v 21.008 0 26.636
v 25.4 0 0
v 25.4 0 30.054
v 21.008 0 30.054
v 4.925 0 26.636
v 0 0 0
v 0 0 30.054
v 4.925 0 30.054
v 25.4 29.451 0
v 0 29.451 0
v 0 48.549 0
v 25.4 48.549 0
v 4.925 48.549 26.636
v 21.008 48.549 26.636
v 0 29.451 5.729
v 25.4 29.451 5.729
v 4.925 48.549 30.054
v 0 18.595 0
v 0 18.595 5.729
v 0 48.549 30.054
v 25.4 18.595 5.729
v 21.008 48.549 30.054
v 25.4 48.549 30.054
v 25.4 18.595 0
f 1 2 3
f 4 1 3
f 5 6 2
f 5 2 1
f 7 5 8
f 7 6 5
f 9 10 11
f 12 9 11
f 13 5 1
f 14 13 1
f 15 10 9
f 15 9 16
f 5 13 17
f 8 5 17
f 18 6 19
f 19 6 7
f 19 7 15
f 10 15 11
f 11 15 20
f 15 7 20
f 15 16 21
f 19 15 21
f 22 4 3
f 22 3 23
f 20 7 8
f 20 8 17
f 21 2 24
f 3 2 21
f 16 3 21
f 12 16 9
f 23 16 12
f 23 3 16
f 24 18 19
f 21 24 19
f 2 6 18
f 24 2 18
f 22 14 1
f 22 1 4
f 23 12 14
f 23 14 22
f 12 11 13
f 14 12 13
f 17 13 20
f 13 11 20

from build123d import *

# Parameters (mm, degrees)
F0_W     = 48.548784
F0_H     = 30.054009
F1_DEPTH = 25.4
F2_W     = 16.082412
F2_H     = 3.417515
F3_DEPTH = 50.8
F4_W     = 10.855629
F4_H     = 5.729359
F5_DEPTH = 50.8


with BuildPart() as f1:
    # F0 (on Right) → F1 (new body)
    with BuildSketch(Plane.YZ):
        with Locations((24.274392, 15.027004)):
            Rectangle(F0_W, F0_H)
    extrude(amount=F1_DEPTH)

    # F2 (on face) → F3 (cut)
    with BuildSketch(Plane.XZ):
        with Locations((12.966445, 28.345251)):
            Rectangle(F2_W, F2_H)
    extrude(amount=-F3_DEPTH, mode=Mode.SUBTRACT)

    # F4 (on face) → F5 (cut)
    with BuildSketch(Plane(origin=(0, 0, 0), x_dir=(0, -1, 0), z_dir=(-1, 0, 0))):
        with Locations((-24.023103, 2.864679)):
            Rectangle(F4_W, F4_H)
    extrude(amount=-F5_DEPTH, mode=Mode.SUBTRACT)


solid = f1.part
